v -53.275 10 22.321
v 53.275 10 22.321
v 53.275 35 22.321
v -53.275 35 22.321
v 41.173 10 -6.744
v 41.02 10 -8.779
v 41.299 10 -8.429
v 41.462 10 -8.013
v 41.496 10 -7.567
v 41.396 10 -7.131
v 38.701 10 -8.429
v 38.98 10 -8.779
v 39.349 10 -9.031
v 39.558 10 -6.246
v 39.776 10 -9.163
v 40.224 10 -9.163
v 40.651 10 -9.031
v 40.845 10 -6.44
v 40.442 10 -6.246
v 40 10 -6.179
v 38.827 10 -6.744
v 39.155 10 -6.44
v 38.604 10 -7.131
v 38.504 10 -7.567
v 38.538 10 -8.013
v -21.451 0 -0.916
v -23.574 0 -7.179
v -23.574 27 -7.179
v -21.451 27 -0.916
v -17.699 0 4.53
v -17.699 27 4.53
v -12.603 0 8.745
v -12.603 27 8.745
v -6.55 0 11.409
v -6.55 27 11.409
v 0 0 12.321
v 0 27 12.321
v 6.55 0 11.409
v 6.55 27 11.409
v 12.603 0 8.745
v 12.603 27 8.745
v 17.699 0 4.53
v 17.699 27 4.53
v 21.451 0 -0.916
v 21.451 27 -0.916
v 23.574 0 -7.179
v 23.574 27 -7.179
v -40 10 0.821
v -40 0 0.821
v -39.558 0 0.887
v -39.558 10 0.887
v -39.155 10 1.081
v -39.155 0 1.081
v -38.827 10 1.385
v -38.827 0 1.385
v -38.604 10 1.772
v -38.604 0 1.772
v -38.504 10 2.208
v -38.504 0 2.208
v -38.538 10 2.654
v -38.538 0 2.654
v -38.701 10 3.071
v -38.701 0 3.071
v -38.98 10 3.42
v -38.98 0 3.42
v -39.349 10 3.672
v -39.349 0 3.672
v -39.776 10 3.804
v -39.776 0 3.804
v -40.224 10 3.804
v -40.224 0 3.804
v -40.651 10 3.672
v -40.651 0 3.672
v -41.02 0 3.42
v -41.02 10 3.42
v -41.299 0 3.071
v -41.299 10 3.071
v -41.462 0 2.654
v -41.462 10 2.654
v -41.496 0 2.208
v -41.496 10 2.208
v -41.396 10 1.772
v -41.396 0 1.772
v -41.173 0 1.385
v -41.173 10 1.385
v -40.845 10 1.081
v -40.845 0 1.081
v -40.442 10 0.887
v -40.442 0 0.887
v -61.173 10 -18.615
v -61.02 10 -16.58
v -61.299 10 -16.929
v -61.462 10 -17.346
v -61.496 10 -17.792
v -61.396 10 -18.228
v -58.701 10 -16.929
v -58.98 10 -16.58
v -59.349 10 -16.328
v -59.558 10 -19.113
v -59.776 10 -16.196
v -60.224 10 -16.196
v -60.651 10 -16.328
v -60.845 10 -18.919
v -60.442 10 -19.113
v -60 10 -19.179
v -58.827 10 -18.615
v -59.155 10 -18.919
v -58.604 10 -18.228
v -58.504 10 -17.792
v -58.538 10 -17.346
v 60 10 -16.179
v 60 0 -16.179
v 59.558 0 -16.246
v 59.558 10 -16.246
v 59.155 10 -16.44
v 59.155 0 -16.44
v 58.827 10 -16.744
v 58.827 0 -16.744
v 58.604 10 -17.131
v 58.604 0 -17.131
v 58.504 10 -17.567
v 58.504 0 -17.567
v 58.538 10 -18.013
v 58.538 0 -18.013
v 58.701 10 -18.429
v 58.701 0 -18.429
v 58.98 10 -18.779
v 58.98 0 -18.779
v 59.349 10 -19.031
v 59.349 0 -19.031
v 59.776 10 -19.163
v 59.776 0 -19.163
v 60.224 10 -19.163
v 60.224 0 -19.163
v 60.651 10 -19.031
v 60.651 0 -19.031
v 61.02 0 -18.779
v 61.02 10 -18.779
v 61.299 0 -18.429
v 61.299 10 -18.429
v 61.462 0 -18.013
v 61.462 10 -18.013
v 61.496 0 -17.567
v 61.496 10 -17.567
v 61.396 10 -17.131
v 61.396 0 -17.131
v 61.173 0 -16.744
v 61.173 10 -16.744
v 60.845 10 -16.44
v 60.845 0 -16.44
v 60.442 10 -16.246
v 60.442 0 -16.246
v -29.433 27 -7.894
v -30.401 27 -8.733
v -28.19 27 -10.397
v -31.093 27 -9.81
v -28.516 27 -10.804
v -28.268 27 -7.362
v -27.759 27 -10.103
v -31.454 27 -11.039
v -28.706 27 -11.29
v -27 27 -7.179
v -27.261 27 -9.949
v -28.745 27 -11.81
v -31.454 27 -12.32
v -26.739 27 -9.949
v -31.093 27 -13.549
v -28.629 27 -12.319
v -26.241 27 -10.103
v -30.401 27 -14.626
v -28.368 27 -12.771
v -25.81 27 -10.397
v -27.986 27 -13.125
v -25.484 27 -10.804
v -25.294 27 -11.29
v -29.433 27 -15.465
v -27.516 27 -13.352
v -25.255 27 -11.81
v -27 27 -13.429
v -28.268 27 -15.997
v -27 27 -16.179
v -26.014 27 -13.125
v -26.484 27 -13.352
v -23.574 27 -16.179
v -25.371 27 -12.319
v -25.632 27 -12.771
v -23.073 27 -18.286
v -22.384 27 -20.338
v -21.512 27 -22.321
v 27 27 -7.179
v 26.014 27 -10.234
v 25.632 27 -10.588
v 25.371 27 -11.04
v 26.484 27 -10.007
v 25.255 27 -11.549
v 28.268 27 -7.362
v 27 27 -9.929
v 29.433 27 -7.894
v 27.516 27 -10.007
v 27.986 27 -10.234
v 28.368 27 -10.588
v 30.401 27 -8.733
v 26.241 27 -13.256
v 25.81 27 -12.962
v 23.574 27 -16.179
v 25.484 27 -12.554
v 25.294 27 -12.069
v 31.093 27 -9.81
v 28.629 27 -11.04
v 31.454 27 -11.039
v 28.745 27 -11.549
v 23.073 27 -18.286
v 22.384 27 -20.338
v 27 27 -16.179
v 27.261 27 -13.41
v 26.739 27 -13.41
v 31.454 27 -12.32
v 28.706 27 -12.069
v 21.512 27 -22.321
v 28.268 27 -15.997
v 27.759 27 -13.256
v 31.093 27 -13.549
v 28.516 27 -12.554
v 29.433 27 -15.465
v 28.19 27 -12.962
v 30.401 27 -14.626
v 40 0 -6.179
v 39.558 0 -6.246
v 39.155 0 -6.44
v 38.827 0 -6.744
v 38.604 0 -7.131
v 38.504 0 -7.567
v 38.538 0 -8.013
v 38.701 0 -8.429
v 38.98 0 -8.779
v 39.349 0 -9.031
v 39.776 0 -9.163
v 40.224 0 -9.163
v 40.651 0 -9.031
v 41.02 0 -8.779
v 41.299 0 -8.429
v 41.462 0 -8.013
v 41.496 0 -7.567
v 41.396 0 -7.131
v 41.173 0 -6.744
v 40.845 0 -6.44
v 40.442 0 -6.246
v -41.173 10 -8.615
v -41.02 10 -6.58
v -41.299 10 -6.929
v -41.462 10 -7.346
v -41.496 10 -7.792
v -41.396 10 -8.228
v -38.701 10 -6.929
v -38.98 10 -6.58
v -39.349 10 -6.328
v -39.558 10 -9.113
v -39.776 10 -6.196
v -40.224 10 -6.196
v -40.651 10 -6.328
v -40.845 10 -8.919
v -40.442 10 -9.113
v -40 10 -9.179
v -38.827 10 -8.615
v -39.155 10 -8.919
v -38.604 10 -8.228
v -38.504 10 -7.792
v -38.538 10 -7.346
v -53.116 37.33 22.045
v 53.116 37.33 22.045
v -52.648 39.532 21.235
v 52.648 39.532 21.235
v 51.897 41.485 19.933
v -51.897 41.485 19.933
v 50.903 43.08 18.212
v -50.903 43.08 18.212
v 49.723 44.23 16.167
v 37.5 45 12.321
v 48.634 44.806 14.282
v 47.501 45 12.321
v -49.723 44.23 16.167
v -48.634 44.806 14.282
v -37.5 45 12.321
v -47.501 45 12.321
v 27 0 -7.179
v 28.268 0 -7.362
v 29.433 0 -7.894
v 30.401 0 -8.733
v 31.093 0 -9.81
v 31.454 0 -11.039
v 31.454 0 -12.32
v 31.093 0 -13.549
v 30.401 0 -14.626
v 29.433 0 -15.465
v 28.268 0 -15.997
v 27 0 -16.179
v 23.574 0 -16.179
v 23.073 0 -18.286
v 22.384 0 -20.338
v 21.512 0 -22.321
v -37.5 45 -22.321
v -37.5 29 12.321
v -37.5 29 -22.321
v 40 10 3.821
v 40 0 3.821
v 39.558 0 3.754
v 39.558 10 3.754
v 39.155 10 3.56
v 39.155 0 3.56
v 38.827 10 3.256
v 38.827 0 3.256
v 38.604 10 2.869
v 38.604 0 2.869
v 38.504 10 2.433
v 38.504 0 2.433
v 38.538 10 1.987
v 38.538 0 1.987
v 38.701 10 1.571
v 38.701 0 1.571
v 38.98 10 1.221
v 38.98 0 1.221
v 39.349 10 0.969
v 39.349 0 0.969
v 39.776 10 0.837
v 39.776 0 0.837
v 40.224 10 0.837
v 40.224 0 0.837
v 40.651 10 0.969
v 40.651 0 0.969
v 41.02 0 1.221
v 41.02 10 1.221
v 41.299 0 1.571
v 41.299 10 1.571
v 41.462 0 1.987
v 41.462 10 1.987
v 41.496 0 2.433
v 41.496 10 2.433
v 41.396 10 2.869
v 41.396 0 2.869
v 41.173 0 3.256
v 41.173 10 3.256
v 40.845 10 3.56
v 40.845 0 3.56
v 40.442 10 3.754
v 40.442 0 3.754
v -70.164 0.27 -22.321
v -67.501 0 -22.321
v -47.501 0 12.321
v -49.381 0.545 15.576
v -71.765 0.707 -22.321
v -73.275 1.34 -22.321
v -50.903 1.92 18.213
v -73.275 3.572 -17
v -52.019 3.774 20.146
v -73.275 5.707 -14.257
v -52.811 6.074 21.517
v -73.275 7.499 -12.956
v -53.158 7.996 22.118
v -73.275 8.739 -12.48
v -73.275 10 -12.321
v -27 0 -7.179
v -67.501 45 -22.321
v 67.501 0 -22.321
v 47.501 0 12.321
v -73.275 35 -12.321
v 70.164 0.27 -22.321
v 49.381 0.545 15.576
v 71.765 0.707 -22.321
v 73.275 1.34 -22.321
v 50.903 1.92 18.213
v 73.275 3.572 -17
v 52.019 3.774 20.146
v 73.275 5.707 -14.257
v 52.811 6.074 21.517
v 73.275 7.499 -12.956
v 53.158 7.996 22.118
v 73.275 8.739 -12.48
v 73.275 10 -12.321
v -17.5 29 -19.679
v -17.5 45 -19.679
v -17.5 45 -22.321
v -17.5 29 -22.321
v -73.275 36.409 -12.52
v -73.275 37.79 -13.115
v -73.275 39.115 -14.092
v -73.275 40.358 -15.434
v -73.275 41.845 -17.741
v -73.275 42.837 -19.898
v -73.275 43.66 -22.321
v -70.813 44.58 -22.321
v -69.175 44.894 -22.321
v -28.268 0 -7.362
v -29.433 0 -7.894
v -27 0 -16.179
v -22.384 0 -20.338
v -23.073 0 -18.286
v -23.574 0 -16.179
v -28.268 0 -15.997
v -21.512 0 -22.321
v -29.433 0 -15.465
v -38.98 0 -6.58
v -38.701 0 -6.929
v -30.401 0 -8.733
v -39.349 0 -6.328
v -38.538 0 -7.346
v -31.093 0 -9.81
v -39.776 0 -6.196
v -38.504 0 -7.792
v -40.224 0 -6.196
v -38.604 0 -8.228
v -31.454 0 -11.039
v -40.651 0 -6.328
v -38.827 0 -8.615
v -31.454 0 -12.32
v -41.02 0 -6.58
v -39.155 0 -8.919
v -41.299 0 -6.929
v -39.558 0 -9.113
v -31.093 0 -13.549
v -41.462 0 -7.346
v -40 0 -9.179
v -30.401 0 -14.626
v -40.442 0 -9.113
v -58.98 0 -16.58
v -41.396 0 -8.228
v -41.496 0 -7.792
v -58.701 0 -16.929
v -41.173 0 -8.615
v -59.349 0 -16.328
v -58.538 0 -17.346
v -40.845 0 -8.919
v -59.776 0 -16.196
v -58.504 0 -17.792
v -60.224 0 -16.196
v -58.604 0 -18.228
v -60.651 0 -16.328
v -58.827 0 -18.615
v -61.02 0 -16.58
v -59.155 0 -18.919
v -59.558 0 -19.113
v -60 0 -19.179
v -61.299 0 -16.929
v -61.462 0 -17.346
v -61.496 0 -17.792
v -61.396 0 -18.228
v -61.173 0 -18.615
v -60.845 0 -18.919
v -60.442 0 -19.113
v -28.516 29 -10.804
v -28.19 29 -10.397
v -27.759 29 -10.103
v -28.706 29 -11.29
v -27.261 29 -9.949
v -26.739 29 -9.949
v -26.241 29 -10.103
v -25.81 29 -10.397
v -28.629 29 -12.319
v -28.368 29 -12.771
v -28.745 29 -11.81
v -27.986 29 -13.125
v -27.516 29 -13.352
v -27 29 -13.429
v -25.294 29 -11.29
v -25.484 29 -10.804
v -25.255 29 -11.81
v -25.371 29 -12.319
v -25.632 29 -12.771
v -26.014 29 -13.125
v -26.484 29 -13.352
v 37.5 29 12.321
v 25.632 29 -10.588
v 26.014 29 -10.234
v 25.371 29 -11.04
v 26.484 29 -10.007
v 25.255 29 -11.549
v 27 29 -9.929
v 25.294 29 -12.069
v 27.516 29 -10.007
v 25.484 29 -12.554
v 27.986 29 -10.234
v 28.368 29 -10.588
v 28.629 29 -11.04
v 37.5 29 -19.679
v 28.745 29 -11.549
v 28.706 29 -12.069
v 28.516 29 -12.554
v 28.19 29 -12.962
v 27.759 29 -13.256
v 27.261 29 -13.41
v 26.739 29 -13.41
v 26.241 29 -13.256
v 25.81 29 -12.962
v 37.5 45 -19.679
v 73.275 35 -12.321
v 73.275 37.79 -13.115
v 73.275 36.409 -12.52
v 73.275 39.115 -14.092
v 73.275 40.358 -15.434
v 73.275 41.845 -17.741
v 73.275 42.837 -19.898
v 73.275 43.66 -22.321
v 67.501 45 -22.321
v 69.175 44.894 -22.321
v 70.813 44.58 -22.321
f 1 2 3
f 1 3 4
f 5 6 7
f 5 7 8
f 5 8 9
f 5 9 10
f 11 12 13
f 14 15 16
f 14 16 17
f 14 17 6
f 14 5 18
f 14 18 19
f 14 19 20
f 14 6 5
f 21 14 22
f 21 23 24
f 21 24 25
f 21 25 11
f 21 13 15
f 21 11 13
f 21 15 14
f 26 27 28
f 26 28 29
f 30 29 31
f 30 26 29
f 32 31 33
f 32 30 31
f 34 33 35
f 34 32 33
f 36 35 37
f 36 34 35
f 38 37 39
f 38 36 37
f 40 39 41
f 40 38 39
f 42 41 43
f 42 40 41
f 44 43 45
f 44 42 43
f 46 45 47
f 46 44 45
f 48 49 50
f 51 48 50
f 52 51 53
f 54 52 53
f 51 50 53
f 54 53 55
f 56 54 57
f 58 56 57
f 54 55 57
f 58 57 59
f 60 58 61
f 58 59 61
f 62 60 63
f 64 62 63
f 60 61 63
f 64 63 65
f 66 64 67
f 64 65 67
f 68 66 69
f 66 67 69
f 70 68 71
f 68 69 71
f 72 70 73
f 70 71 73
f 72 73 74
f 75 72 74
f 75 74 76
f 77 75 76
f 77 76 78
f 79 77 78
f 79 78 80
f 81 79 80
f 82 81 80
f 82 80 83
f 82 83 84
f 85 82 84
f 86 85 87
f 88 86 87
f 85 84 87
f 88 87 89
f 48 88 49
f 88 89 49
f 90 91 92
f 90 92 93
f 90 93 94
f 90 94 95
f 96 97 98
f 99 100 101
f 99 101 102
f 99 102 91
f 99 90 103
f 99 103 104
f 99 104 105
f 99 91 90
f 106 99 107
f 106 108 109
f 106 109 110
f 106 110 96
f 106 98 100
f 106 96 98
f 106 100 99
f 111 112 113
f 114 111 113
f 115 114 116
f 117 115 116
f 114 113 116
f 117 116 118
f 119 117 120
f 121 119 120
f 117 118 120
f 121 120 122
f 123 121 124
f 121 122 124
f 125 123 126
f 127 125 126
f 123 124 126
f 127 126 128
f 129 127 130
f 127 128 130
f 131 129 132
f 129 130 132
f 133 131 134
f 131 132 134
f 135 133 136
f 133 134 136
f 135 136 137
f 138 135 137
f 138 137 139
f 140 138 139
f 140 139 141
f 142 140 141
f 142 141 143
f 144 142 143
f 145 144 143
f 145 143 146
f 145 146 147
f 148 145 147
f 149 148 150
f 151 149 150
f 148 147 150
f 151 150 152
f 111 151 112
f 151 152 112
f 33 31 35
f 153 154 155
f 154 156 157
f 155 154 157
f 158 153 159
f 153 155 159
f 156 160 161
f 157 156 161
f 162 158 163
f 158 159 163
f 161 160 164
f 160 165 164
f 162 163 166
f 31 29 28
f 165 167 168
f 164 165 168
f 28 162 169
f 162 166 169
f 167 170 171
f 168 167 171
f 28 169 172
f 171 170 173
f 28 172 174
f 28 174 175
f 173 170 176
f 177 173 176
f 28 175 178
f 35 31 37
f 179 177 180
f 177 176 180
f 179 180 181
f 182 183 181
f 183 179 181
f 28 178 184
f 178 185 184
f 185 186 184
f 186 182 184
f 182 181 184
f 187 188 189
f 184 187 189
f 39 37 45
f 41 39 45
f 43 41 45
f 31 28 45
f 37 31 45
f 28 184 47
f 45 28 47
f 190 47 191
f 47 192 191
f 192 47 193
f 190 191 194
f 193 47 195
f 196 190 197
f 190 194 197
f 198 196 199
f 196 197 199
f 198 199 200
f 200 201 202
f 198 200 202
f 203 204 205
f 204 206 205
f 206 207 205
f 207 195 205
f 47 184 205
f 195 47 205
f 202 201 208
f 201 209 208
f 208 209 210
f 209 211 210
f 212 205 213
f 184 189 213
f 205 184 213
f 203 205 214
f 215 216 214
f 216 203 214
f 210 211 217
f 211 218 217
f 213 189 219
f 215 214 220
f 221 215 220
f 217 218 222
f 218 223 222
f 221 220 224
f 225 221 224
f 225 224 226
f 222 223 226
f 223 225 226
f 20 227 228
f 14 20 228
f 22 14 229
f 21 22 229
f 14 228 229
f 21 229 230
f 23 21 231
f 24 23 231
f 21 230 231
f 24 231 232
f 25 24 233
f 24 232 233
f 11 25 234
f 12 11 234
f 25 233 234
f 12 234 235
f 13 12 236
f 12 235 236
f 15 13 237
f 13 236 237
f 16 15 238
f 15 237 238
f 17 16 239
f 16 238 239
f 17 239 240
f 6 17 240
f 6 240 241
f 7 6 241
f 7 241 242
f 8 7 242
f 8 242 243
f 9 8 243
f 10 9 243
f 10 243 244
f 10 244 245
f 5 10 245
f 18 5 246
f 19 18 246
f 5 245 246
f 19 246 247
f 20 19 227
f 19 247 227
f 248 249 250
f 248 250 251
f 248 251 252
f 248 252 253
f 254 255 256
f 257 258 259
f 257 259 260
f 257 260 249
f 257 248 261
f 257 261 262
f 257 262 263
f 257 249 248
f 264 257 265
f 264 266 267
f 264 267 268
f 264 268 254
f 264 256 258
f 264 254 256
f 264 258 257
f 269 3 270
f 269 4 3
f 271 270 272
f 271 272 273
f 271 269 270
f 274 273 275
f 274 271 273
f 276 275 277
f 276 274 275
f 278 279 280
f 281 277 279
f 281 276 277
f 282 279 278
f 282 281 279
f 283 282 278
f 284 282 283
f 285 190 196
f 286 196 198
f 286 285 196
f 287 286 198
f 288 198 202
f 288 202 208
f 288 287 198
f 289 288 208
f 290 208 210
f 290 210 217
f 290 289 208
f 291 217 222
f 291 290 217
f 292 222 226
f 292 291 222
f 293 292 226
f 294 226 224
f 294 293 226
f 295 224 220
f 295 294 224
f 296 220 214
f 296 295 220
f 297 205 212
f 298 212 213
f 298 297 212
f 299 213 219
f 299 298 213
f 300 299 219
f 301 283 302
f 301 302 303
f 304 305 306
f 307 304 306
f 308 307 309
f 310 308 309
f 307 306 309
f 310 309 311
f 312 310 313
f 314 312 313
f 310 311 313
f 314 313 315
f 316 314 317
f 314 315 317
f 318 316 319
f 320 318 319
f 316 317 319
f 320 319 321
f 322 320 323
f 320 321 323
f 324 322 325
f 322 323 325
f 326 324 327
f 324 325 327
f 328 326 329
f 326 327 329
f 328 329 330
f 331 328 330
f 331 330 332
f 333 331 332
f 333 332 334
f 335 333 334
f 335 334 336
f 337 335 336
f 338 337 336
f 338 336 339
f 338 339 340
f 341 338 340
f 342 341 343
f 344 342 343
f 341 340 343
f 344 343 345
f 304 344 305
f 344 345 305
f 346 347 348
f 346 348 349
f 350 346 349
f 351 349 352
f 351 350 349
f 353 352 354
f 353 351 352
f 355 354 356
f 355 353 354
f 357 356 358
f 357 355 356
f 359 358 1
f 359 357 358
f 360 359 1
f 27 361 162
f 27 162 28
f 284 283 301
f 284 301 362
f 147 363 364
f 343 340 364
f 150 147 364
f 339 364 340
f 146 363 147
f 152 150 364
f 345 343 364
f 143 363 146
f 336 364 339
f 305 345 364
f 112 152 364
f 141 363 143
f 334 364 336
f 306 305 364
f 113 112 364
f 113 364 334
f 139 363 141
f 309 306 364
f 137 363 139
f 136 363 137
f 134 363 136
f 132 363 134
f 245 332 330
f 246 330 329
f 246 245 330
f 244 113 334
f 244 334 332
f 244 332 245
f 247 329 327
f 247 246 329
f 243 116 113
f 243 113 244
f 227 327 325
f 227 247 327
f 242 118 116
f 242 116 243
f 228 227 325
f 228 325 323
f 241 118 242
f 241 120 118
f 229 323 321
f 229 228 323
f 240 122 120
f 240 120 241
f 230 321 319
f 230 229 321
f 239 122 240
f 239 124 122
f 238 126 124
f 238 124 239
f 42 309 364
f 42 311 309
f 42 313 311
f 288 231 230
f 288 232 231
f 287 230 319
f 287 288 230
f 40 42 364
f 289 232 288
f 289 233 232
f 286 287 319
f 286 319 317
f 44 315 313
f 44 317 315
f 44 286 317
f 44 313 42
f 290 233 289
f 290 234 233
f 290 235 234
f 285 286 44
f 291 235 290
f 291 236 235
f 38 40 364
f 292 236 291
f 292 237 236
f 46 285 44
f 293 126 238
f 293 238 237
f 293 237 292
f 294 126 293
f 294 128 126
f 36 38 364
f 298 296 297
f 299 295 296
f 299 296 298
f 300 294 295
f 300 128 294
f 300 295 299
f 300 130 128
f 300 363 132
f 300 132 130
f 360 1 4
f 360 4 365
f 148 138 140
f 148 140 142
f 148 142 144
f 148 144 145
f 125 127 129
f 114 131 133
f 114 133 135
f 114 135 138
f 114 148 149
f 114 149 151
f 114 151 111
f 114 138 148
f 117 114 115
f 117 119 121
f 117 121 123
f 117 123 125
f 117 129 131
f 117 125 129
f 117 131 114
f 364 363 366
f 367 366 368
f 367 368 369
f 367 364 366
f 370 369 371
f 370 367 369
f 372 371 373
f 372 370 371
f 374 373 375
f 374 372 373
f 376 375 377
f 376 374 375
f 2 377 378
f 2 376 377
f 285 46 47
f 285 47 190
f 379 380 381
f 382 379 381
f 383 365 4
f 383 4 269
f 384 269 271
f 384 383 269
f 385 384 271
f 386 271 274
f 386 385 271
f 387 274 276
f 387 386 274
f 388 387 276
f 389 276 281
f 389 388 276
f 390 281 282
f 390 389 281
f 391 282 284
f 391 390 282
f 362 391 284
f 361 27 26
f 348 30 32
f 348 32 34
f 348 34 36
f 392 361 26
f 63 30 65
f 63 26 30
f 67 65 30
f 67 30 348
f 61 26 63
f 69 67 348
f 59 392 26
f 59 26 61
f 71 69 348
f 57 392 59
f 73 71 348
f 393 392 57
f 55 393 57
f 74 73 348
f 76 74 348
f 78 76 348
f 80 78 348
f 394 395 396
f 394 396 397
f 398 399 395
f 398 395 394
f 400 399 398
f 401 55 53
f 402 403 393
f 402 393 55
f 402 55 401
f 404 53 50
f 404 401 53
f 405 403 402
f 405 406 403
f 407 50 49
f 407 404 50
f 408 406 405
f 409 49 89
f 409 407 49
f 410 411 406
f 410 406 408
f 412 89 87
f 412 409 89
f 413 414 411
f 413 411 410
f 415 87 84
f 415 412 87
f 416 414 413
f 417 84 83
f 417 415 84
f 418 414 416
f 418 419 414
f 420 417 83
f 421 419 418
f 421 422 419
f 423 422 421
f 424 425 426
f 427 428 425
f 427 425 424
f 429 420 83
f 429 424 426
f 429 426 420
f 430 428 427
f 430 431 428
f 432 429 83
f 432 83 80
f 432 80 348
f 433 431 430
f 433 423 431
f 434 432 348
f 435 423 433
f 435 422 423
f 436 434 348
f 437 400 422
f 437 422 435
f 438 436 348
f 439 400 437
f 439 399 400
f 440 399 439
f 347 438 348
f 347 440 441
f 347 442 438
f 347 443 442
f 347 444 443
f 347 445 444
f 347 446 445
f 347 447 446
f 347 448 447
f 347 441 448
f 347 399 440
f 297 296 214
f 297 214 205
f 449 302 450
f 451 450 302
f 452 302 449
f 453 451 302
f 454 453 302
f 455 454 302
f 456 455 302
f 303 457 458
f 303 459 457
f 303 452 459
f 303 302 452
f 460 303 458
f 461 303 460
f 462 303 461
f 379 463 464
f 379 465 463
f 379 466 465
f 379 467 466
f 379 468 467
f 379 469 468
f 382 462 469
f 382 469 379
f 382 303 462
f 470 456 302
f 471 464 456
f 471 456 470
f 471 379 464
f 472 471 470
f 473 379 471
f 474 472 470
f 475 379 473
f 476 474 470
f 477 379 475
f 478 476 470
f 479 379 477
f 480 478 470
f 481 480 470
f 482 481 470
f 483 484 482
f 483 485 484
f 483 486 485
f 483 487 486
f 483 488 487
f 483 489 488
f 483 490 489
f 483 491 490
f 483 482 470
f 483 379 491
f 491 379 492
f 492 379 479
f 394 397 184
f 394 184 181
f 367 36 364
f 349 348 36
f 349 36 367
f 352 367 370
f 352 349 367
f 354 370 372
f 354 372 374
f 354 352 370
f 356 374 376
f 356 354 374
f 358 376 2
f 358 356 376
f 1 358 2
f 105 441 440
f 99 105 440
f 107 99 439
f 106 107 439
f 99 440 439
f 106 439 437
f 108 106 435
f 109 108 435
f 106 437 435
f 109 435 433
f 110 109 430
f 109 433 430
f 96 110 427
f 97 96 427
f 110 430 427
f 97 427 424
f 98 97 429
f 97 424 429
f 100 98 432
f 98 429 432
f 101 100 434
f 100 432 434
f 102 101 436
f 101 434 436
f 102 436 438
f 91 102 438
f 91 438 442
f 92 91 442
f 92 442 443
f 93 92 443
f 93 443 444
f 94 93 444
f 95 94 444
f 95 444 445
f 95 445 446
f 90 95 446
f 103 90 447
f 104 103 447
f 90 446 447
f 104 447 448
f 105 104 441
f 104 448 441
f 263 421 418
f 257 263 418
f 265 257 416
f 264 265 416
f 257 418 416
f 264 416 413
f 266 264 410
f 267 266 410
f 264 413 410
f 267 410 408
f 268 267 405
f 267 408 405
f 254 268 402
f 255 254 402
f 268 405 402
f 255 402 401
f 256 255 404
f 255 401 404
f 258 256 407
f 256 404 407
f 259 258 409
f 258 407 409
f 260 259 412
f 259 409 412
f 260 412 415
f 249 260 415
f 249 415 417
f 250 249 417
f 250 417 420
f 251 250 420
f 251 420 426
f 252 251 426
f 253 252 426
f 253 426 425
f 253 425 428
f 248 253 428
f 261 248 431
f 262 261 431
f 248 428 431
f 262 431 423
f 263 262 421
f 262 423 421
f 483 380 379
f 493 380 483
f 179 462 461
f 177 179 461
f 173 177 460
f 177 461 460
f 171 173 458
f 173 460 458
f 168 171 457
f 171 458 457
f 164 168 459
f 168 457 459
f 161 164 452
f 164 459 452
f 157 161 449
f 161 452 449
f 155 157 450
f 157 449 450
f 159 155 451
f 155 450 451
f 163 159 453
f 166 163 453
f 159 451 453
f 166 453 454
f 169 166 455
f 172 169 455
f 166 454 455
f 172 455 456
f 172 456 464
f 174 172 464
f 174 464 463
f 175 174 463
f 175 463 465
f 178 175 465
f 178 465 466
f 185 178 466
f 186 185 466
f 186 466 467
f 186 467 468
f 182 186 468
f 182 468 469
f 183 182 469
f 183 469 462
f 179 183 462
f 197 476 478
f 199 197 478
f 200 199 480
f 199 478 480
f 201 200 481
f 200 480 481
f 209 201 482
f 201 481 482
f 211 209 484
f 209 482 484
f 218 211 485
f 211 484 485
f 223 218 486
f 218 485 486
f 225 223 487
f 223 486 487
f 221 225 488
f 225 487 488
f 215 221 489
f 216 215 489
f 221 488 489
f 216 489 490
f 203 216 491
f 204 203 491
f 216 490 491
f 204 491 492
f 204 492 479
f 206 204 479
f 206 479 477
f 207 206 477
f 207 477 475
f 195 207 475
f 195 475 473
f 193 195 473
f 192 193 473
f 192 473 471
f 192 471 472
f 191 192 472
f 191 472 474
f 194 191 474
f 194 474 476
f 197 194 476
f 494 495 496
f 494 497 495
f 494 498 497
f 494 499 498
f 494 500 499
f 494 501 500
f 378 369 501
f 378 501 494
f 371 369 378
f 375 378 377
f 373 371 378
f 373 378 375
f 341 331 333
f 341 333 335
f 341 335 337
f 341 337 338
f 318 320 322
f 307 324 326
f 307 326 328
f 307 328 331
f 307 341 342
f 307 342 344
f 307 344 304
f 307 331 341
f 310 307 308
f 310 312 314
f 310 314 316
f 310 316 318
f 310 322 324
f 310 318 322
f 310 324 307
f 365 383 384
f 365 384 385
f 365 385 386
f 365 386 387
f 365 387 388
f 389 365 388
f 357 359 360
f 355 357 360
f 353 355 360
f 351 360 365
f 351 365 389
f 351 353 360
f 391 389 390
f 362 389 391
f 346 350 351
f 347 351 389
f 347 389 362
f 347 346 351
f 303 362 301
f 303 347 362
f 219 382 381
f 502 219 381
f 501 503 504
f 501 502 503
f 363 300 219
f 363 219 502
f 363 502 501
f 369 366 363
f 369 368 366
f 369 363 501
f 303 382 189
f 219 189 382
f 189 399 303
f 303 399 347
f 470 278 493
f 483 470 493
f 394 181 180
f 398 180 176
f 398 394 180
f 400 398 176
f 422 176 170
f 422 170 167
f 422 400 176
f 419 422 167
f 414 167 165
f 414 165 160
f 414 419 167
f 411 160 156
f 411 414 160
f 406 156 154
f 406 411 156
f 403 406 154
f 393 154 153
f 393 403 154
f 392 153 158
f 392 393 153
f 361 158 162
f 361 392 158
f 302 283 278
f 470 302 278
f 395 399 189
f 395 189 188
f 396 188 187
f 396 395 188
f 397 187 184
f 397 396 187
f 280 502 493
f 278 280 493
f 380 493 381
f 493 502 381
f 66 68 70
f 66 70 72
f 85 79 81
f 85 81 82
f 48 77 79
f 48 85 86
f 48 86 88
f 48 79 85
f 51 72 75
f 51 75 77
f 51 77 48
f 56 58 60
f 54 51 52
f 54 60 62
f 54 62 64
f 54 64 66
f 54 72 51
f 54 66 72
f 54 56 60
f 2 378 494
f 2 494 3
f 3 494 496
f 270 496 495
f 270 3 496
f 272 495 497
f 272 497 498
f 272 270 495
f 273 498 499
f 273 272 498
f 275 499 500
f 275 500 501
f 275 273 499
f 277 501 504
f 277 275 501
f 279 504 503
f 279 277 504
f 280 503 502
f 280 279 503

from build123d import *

# Parameters (mm, degrees)
BOSS_EXTRUDE2_DEPTH = 45
FILLET2_R           = 10
FILLET3_R           = 10
SKETCH6_R           = 1.5
CUT_EXTRUDE5_DEPTH  = 10
SKETCH7_R           = 1.5
CUT_EXTRUDE6_DEPTH  = 10
CUT_EXTRUDE7_DEPTH  = 27
SKETCH3_W           = 75
SKETCH3_H           = 32
CUT_EXTRUDE8_DEPTH  = 16
SKETCH11_R          = 1.75
CUT_EXTRUDE9_DEPTH  = 20
SKETCH12_W          = 20
SKETCH12_H          = 2.641016152
CUT_EXTRUDE11_DEPTH = 16


with BuildPart() as part:
    # Sketch2 → Boss-Extrude2 (new body)
    with BuildSketch(Plane(origin=(0, 0, 0), x_dir=(1, 0, 0), z_dir=(0, 1, 0))):
        Polygon((-73.275, 22.320508076), (73.275, 22.320508076), (73.275, 12.320508076), (53.275, -22.320508076), (-53.275, -22.320508076), (-73.275, 12.320508076), align=None)
    extrude(amount=BOSS_EXTRUDE2_DEPTH)

    # Fillet2
    fillet2_edges = [part.edges().sort_by_distance(p)[0] for p in [
        (63.275, 45, 5),
        (0, 45, 22.320508076),
        (-63.275, 45, 5),
    ]]
    fillet(fillet2_edges, radius=FILLET2_R)

    # Fillet3
    fillet3_edges = [part.edges().sort_by_distance(p)[0] for p in [
        (-63.275, 0, 5),
        (63.275, 0, 5),
        (0, 0, 22.320508076),
    ]]
    fillet(fillet3_edges, radius=FILLET3_R)

    # Sketch6 → Cut-Extrude5 (cut)
    with BuildSketch(Plane(origin=(0, 0, 0), x_dir=(-1, 0, 0), z_dir=(0, -1, 0))):
        with Locations(Location((40, -2.320508076, 0), (0, 0, 90))):
            Circle(SKETCH6_R)
        with Locations(Location((-40, -2.320508076, 0), (0, 0, 270))):
            Circle(SKETCH6_R)
        with Locations(Location((60, 17.679491924, 0), (0, 0, 90))):
            Circle(SKETCH6_R)
        with Locations(Location((-60, 17.679491924, 0), (0, 0, 270))):
            Circle(SKETCH6_R)
    extrude(amount=-CUT_EXTRUDE5_DEPTH, mode=Mode.SUBTRACT)

    # Sketch7 → Cut-Extrude6 (cut)
    with BuildSketch(Plane(origin=(0, 0, 0), x_dir=(-1, 0, 0), z_dir=(0, -1, 0))):
        with Locations(Location((40, 7.679491924, 0), (0, 0, 90))):
            Circle(SKETCH7_R)
        with Locations(Location((-40, 7.679491924, 0), (0, 0, 270))):
            Circle(SKETCH7_R)
    extrude(amount=-CUT_EXTRUDE6_DEPTH, mode=Mode.SUBTRACT)

    # Sketch9 → Cut-Extrude7 (cut)
    with BuildSketch(Plane(origin=(0, 0, 0), x_dir=(-1, 0, 0), z_dir=(0, -1, 0))):
        with BuildLine():
            Line((27, 7.179491924), (23.574350468, 7.179491924))
            ThreePointArc((23.574350468, 7.179491924), (0, -12.320508076), (-23.574350468, 7.179491924))
            Line((-23.574350468, 7.179491924), (-27, 7.179491924))
            ThreePointArc((-27, 7.179491924), (-31.5, 11.679491924), (-27, 16.179491924))
            Line((-27, 16.179491924), (-23.574350468, 16.179491924))
            ThreePointArc((-23.574350468, 16.179491924), (0, 35.679491924), (23.574350468, 16.179491924))
            Line((23.574350468, 16.179491924), (27, 16.179491924))
            ThreePointArc((27, 16.179491924), (31.5, 11.679491924), (27, 7.179491924))
        make_face()
    extrude(amount=-CUT_EXTRUDE7_DEPTH, mode=Mode.SUBTRACT)

    # Sketch3 → Cut-Extrude8 (cut)
    with BuildSketch(Plane(origin=(0, 45, 0), x_dir=(1, 0, 0), z_dir=(0, 1, 0))):
        with Locations((0, 3.679491924)):
            Rectangle(SKETCH3_W, SKETCH3_H)
    extrude(amount=-CUT_EXTRUDE8_DEPTH, mode=Mode.SUBTRACT)

    # Sketch11 → Cut-Extrude9 (cut)
    with BuildSketch(Plane(origin=(0, 29, 0), x_dir=(1, 0, 0), z_dir=(0, 1, 0))):
        with Locations(Location((27, 11.679491924, 0), (0, 0, 270))):
            Circle(SKETCH11_R)
        with Locations(Location((-27, 11.679491924, 0), (0, 0, 90))):
            Circle(SKETCH11_R)
    extrude(amount=-CUT_EXTRUDE9_DEPTH, mode=Mode.SUBTRACT)

    # Sketch12 → Cut-Extrude11 (cut)
    with BuildSketch(Plane(origin=(0, 45, 0), x_dir=(1, 0, 0), z_dir=(0, 1, 0))):
        with Locations((-27.5, 21)):
            Rectangle(SKETCH12_W, SKETCH12_H)
    extrude(amount=-CUT_EXTRUDE11_DEPTH, mode=Mode.SUBTRACT)


solid = part.part
